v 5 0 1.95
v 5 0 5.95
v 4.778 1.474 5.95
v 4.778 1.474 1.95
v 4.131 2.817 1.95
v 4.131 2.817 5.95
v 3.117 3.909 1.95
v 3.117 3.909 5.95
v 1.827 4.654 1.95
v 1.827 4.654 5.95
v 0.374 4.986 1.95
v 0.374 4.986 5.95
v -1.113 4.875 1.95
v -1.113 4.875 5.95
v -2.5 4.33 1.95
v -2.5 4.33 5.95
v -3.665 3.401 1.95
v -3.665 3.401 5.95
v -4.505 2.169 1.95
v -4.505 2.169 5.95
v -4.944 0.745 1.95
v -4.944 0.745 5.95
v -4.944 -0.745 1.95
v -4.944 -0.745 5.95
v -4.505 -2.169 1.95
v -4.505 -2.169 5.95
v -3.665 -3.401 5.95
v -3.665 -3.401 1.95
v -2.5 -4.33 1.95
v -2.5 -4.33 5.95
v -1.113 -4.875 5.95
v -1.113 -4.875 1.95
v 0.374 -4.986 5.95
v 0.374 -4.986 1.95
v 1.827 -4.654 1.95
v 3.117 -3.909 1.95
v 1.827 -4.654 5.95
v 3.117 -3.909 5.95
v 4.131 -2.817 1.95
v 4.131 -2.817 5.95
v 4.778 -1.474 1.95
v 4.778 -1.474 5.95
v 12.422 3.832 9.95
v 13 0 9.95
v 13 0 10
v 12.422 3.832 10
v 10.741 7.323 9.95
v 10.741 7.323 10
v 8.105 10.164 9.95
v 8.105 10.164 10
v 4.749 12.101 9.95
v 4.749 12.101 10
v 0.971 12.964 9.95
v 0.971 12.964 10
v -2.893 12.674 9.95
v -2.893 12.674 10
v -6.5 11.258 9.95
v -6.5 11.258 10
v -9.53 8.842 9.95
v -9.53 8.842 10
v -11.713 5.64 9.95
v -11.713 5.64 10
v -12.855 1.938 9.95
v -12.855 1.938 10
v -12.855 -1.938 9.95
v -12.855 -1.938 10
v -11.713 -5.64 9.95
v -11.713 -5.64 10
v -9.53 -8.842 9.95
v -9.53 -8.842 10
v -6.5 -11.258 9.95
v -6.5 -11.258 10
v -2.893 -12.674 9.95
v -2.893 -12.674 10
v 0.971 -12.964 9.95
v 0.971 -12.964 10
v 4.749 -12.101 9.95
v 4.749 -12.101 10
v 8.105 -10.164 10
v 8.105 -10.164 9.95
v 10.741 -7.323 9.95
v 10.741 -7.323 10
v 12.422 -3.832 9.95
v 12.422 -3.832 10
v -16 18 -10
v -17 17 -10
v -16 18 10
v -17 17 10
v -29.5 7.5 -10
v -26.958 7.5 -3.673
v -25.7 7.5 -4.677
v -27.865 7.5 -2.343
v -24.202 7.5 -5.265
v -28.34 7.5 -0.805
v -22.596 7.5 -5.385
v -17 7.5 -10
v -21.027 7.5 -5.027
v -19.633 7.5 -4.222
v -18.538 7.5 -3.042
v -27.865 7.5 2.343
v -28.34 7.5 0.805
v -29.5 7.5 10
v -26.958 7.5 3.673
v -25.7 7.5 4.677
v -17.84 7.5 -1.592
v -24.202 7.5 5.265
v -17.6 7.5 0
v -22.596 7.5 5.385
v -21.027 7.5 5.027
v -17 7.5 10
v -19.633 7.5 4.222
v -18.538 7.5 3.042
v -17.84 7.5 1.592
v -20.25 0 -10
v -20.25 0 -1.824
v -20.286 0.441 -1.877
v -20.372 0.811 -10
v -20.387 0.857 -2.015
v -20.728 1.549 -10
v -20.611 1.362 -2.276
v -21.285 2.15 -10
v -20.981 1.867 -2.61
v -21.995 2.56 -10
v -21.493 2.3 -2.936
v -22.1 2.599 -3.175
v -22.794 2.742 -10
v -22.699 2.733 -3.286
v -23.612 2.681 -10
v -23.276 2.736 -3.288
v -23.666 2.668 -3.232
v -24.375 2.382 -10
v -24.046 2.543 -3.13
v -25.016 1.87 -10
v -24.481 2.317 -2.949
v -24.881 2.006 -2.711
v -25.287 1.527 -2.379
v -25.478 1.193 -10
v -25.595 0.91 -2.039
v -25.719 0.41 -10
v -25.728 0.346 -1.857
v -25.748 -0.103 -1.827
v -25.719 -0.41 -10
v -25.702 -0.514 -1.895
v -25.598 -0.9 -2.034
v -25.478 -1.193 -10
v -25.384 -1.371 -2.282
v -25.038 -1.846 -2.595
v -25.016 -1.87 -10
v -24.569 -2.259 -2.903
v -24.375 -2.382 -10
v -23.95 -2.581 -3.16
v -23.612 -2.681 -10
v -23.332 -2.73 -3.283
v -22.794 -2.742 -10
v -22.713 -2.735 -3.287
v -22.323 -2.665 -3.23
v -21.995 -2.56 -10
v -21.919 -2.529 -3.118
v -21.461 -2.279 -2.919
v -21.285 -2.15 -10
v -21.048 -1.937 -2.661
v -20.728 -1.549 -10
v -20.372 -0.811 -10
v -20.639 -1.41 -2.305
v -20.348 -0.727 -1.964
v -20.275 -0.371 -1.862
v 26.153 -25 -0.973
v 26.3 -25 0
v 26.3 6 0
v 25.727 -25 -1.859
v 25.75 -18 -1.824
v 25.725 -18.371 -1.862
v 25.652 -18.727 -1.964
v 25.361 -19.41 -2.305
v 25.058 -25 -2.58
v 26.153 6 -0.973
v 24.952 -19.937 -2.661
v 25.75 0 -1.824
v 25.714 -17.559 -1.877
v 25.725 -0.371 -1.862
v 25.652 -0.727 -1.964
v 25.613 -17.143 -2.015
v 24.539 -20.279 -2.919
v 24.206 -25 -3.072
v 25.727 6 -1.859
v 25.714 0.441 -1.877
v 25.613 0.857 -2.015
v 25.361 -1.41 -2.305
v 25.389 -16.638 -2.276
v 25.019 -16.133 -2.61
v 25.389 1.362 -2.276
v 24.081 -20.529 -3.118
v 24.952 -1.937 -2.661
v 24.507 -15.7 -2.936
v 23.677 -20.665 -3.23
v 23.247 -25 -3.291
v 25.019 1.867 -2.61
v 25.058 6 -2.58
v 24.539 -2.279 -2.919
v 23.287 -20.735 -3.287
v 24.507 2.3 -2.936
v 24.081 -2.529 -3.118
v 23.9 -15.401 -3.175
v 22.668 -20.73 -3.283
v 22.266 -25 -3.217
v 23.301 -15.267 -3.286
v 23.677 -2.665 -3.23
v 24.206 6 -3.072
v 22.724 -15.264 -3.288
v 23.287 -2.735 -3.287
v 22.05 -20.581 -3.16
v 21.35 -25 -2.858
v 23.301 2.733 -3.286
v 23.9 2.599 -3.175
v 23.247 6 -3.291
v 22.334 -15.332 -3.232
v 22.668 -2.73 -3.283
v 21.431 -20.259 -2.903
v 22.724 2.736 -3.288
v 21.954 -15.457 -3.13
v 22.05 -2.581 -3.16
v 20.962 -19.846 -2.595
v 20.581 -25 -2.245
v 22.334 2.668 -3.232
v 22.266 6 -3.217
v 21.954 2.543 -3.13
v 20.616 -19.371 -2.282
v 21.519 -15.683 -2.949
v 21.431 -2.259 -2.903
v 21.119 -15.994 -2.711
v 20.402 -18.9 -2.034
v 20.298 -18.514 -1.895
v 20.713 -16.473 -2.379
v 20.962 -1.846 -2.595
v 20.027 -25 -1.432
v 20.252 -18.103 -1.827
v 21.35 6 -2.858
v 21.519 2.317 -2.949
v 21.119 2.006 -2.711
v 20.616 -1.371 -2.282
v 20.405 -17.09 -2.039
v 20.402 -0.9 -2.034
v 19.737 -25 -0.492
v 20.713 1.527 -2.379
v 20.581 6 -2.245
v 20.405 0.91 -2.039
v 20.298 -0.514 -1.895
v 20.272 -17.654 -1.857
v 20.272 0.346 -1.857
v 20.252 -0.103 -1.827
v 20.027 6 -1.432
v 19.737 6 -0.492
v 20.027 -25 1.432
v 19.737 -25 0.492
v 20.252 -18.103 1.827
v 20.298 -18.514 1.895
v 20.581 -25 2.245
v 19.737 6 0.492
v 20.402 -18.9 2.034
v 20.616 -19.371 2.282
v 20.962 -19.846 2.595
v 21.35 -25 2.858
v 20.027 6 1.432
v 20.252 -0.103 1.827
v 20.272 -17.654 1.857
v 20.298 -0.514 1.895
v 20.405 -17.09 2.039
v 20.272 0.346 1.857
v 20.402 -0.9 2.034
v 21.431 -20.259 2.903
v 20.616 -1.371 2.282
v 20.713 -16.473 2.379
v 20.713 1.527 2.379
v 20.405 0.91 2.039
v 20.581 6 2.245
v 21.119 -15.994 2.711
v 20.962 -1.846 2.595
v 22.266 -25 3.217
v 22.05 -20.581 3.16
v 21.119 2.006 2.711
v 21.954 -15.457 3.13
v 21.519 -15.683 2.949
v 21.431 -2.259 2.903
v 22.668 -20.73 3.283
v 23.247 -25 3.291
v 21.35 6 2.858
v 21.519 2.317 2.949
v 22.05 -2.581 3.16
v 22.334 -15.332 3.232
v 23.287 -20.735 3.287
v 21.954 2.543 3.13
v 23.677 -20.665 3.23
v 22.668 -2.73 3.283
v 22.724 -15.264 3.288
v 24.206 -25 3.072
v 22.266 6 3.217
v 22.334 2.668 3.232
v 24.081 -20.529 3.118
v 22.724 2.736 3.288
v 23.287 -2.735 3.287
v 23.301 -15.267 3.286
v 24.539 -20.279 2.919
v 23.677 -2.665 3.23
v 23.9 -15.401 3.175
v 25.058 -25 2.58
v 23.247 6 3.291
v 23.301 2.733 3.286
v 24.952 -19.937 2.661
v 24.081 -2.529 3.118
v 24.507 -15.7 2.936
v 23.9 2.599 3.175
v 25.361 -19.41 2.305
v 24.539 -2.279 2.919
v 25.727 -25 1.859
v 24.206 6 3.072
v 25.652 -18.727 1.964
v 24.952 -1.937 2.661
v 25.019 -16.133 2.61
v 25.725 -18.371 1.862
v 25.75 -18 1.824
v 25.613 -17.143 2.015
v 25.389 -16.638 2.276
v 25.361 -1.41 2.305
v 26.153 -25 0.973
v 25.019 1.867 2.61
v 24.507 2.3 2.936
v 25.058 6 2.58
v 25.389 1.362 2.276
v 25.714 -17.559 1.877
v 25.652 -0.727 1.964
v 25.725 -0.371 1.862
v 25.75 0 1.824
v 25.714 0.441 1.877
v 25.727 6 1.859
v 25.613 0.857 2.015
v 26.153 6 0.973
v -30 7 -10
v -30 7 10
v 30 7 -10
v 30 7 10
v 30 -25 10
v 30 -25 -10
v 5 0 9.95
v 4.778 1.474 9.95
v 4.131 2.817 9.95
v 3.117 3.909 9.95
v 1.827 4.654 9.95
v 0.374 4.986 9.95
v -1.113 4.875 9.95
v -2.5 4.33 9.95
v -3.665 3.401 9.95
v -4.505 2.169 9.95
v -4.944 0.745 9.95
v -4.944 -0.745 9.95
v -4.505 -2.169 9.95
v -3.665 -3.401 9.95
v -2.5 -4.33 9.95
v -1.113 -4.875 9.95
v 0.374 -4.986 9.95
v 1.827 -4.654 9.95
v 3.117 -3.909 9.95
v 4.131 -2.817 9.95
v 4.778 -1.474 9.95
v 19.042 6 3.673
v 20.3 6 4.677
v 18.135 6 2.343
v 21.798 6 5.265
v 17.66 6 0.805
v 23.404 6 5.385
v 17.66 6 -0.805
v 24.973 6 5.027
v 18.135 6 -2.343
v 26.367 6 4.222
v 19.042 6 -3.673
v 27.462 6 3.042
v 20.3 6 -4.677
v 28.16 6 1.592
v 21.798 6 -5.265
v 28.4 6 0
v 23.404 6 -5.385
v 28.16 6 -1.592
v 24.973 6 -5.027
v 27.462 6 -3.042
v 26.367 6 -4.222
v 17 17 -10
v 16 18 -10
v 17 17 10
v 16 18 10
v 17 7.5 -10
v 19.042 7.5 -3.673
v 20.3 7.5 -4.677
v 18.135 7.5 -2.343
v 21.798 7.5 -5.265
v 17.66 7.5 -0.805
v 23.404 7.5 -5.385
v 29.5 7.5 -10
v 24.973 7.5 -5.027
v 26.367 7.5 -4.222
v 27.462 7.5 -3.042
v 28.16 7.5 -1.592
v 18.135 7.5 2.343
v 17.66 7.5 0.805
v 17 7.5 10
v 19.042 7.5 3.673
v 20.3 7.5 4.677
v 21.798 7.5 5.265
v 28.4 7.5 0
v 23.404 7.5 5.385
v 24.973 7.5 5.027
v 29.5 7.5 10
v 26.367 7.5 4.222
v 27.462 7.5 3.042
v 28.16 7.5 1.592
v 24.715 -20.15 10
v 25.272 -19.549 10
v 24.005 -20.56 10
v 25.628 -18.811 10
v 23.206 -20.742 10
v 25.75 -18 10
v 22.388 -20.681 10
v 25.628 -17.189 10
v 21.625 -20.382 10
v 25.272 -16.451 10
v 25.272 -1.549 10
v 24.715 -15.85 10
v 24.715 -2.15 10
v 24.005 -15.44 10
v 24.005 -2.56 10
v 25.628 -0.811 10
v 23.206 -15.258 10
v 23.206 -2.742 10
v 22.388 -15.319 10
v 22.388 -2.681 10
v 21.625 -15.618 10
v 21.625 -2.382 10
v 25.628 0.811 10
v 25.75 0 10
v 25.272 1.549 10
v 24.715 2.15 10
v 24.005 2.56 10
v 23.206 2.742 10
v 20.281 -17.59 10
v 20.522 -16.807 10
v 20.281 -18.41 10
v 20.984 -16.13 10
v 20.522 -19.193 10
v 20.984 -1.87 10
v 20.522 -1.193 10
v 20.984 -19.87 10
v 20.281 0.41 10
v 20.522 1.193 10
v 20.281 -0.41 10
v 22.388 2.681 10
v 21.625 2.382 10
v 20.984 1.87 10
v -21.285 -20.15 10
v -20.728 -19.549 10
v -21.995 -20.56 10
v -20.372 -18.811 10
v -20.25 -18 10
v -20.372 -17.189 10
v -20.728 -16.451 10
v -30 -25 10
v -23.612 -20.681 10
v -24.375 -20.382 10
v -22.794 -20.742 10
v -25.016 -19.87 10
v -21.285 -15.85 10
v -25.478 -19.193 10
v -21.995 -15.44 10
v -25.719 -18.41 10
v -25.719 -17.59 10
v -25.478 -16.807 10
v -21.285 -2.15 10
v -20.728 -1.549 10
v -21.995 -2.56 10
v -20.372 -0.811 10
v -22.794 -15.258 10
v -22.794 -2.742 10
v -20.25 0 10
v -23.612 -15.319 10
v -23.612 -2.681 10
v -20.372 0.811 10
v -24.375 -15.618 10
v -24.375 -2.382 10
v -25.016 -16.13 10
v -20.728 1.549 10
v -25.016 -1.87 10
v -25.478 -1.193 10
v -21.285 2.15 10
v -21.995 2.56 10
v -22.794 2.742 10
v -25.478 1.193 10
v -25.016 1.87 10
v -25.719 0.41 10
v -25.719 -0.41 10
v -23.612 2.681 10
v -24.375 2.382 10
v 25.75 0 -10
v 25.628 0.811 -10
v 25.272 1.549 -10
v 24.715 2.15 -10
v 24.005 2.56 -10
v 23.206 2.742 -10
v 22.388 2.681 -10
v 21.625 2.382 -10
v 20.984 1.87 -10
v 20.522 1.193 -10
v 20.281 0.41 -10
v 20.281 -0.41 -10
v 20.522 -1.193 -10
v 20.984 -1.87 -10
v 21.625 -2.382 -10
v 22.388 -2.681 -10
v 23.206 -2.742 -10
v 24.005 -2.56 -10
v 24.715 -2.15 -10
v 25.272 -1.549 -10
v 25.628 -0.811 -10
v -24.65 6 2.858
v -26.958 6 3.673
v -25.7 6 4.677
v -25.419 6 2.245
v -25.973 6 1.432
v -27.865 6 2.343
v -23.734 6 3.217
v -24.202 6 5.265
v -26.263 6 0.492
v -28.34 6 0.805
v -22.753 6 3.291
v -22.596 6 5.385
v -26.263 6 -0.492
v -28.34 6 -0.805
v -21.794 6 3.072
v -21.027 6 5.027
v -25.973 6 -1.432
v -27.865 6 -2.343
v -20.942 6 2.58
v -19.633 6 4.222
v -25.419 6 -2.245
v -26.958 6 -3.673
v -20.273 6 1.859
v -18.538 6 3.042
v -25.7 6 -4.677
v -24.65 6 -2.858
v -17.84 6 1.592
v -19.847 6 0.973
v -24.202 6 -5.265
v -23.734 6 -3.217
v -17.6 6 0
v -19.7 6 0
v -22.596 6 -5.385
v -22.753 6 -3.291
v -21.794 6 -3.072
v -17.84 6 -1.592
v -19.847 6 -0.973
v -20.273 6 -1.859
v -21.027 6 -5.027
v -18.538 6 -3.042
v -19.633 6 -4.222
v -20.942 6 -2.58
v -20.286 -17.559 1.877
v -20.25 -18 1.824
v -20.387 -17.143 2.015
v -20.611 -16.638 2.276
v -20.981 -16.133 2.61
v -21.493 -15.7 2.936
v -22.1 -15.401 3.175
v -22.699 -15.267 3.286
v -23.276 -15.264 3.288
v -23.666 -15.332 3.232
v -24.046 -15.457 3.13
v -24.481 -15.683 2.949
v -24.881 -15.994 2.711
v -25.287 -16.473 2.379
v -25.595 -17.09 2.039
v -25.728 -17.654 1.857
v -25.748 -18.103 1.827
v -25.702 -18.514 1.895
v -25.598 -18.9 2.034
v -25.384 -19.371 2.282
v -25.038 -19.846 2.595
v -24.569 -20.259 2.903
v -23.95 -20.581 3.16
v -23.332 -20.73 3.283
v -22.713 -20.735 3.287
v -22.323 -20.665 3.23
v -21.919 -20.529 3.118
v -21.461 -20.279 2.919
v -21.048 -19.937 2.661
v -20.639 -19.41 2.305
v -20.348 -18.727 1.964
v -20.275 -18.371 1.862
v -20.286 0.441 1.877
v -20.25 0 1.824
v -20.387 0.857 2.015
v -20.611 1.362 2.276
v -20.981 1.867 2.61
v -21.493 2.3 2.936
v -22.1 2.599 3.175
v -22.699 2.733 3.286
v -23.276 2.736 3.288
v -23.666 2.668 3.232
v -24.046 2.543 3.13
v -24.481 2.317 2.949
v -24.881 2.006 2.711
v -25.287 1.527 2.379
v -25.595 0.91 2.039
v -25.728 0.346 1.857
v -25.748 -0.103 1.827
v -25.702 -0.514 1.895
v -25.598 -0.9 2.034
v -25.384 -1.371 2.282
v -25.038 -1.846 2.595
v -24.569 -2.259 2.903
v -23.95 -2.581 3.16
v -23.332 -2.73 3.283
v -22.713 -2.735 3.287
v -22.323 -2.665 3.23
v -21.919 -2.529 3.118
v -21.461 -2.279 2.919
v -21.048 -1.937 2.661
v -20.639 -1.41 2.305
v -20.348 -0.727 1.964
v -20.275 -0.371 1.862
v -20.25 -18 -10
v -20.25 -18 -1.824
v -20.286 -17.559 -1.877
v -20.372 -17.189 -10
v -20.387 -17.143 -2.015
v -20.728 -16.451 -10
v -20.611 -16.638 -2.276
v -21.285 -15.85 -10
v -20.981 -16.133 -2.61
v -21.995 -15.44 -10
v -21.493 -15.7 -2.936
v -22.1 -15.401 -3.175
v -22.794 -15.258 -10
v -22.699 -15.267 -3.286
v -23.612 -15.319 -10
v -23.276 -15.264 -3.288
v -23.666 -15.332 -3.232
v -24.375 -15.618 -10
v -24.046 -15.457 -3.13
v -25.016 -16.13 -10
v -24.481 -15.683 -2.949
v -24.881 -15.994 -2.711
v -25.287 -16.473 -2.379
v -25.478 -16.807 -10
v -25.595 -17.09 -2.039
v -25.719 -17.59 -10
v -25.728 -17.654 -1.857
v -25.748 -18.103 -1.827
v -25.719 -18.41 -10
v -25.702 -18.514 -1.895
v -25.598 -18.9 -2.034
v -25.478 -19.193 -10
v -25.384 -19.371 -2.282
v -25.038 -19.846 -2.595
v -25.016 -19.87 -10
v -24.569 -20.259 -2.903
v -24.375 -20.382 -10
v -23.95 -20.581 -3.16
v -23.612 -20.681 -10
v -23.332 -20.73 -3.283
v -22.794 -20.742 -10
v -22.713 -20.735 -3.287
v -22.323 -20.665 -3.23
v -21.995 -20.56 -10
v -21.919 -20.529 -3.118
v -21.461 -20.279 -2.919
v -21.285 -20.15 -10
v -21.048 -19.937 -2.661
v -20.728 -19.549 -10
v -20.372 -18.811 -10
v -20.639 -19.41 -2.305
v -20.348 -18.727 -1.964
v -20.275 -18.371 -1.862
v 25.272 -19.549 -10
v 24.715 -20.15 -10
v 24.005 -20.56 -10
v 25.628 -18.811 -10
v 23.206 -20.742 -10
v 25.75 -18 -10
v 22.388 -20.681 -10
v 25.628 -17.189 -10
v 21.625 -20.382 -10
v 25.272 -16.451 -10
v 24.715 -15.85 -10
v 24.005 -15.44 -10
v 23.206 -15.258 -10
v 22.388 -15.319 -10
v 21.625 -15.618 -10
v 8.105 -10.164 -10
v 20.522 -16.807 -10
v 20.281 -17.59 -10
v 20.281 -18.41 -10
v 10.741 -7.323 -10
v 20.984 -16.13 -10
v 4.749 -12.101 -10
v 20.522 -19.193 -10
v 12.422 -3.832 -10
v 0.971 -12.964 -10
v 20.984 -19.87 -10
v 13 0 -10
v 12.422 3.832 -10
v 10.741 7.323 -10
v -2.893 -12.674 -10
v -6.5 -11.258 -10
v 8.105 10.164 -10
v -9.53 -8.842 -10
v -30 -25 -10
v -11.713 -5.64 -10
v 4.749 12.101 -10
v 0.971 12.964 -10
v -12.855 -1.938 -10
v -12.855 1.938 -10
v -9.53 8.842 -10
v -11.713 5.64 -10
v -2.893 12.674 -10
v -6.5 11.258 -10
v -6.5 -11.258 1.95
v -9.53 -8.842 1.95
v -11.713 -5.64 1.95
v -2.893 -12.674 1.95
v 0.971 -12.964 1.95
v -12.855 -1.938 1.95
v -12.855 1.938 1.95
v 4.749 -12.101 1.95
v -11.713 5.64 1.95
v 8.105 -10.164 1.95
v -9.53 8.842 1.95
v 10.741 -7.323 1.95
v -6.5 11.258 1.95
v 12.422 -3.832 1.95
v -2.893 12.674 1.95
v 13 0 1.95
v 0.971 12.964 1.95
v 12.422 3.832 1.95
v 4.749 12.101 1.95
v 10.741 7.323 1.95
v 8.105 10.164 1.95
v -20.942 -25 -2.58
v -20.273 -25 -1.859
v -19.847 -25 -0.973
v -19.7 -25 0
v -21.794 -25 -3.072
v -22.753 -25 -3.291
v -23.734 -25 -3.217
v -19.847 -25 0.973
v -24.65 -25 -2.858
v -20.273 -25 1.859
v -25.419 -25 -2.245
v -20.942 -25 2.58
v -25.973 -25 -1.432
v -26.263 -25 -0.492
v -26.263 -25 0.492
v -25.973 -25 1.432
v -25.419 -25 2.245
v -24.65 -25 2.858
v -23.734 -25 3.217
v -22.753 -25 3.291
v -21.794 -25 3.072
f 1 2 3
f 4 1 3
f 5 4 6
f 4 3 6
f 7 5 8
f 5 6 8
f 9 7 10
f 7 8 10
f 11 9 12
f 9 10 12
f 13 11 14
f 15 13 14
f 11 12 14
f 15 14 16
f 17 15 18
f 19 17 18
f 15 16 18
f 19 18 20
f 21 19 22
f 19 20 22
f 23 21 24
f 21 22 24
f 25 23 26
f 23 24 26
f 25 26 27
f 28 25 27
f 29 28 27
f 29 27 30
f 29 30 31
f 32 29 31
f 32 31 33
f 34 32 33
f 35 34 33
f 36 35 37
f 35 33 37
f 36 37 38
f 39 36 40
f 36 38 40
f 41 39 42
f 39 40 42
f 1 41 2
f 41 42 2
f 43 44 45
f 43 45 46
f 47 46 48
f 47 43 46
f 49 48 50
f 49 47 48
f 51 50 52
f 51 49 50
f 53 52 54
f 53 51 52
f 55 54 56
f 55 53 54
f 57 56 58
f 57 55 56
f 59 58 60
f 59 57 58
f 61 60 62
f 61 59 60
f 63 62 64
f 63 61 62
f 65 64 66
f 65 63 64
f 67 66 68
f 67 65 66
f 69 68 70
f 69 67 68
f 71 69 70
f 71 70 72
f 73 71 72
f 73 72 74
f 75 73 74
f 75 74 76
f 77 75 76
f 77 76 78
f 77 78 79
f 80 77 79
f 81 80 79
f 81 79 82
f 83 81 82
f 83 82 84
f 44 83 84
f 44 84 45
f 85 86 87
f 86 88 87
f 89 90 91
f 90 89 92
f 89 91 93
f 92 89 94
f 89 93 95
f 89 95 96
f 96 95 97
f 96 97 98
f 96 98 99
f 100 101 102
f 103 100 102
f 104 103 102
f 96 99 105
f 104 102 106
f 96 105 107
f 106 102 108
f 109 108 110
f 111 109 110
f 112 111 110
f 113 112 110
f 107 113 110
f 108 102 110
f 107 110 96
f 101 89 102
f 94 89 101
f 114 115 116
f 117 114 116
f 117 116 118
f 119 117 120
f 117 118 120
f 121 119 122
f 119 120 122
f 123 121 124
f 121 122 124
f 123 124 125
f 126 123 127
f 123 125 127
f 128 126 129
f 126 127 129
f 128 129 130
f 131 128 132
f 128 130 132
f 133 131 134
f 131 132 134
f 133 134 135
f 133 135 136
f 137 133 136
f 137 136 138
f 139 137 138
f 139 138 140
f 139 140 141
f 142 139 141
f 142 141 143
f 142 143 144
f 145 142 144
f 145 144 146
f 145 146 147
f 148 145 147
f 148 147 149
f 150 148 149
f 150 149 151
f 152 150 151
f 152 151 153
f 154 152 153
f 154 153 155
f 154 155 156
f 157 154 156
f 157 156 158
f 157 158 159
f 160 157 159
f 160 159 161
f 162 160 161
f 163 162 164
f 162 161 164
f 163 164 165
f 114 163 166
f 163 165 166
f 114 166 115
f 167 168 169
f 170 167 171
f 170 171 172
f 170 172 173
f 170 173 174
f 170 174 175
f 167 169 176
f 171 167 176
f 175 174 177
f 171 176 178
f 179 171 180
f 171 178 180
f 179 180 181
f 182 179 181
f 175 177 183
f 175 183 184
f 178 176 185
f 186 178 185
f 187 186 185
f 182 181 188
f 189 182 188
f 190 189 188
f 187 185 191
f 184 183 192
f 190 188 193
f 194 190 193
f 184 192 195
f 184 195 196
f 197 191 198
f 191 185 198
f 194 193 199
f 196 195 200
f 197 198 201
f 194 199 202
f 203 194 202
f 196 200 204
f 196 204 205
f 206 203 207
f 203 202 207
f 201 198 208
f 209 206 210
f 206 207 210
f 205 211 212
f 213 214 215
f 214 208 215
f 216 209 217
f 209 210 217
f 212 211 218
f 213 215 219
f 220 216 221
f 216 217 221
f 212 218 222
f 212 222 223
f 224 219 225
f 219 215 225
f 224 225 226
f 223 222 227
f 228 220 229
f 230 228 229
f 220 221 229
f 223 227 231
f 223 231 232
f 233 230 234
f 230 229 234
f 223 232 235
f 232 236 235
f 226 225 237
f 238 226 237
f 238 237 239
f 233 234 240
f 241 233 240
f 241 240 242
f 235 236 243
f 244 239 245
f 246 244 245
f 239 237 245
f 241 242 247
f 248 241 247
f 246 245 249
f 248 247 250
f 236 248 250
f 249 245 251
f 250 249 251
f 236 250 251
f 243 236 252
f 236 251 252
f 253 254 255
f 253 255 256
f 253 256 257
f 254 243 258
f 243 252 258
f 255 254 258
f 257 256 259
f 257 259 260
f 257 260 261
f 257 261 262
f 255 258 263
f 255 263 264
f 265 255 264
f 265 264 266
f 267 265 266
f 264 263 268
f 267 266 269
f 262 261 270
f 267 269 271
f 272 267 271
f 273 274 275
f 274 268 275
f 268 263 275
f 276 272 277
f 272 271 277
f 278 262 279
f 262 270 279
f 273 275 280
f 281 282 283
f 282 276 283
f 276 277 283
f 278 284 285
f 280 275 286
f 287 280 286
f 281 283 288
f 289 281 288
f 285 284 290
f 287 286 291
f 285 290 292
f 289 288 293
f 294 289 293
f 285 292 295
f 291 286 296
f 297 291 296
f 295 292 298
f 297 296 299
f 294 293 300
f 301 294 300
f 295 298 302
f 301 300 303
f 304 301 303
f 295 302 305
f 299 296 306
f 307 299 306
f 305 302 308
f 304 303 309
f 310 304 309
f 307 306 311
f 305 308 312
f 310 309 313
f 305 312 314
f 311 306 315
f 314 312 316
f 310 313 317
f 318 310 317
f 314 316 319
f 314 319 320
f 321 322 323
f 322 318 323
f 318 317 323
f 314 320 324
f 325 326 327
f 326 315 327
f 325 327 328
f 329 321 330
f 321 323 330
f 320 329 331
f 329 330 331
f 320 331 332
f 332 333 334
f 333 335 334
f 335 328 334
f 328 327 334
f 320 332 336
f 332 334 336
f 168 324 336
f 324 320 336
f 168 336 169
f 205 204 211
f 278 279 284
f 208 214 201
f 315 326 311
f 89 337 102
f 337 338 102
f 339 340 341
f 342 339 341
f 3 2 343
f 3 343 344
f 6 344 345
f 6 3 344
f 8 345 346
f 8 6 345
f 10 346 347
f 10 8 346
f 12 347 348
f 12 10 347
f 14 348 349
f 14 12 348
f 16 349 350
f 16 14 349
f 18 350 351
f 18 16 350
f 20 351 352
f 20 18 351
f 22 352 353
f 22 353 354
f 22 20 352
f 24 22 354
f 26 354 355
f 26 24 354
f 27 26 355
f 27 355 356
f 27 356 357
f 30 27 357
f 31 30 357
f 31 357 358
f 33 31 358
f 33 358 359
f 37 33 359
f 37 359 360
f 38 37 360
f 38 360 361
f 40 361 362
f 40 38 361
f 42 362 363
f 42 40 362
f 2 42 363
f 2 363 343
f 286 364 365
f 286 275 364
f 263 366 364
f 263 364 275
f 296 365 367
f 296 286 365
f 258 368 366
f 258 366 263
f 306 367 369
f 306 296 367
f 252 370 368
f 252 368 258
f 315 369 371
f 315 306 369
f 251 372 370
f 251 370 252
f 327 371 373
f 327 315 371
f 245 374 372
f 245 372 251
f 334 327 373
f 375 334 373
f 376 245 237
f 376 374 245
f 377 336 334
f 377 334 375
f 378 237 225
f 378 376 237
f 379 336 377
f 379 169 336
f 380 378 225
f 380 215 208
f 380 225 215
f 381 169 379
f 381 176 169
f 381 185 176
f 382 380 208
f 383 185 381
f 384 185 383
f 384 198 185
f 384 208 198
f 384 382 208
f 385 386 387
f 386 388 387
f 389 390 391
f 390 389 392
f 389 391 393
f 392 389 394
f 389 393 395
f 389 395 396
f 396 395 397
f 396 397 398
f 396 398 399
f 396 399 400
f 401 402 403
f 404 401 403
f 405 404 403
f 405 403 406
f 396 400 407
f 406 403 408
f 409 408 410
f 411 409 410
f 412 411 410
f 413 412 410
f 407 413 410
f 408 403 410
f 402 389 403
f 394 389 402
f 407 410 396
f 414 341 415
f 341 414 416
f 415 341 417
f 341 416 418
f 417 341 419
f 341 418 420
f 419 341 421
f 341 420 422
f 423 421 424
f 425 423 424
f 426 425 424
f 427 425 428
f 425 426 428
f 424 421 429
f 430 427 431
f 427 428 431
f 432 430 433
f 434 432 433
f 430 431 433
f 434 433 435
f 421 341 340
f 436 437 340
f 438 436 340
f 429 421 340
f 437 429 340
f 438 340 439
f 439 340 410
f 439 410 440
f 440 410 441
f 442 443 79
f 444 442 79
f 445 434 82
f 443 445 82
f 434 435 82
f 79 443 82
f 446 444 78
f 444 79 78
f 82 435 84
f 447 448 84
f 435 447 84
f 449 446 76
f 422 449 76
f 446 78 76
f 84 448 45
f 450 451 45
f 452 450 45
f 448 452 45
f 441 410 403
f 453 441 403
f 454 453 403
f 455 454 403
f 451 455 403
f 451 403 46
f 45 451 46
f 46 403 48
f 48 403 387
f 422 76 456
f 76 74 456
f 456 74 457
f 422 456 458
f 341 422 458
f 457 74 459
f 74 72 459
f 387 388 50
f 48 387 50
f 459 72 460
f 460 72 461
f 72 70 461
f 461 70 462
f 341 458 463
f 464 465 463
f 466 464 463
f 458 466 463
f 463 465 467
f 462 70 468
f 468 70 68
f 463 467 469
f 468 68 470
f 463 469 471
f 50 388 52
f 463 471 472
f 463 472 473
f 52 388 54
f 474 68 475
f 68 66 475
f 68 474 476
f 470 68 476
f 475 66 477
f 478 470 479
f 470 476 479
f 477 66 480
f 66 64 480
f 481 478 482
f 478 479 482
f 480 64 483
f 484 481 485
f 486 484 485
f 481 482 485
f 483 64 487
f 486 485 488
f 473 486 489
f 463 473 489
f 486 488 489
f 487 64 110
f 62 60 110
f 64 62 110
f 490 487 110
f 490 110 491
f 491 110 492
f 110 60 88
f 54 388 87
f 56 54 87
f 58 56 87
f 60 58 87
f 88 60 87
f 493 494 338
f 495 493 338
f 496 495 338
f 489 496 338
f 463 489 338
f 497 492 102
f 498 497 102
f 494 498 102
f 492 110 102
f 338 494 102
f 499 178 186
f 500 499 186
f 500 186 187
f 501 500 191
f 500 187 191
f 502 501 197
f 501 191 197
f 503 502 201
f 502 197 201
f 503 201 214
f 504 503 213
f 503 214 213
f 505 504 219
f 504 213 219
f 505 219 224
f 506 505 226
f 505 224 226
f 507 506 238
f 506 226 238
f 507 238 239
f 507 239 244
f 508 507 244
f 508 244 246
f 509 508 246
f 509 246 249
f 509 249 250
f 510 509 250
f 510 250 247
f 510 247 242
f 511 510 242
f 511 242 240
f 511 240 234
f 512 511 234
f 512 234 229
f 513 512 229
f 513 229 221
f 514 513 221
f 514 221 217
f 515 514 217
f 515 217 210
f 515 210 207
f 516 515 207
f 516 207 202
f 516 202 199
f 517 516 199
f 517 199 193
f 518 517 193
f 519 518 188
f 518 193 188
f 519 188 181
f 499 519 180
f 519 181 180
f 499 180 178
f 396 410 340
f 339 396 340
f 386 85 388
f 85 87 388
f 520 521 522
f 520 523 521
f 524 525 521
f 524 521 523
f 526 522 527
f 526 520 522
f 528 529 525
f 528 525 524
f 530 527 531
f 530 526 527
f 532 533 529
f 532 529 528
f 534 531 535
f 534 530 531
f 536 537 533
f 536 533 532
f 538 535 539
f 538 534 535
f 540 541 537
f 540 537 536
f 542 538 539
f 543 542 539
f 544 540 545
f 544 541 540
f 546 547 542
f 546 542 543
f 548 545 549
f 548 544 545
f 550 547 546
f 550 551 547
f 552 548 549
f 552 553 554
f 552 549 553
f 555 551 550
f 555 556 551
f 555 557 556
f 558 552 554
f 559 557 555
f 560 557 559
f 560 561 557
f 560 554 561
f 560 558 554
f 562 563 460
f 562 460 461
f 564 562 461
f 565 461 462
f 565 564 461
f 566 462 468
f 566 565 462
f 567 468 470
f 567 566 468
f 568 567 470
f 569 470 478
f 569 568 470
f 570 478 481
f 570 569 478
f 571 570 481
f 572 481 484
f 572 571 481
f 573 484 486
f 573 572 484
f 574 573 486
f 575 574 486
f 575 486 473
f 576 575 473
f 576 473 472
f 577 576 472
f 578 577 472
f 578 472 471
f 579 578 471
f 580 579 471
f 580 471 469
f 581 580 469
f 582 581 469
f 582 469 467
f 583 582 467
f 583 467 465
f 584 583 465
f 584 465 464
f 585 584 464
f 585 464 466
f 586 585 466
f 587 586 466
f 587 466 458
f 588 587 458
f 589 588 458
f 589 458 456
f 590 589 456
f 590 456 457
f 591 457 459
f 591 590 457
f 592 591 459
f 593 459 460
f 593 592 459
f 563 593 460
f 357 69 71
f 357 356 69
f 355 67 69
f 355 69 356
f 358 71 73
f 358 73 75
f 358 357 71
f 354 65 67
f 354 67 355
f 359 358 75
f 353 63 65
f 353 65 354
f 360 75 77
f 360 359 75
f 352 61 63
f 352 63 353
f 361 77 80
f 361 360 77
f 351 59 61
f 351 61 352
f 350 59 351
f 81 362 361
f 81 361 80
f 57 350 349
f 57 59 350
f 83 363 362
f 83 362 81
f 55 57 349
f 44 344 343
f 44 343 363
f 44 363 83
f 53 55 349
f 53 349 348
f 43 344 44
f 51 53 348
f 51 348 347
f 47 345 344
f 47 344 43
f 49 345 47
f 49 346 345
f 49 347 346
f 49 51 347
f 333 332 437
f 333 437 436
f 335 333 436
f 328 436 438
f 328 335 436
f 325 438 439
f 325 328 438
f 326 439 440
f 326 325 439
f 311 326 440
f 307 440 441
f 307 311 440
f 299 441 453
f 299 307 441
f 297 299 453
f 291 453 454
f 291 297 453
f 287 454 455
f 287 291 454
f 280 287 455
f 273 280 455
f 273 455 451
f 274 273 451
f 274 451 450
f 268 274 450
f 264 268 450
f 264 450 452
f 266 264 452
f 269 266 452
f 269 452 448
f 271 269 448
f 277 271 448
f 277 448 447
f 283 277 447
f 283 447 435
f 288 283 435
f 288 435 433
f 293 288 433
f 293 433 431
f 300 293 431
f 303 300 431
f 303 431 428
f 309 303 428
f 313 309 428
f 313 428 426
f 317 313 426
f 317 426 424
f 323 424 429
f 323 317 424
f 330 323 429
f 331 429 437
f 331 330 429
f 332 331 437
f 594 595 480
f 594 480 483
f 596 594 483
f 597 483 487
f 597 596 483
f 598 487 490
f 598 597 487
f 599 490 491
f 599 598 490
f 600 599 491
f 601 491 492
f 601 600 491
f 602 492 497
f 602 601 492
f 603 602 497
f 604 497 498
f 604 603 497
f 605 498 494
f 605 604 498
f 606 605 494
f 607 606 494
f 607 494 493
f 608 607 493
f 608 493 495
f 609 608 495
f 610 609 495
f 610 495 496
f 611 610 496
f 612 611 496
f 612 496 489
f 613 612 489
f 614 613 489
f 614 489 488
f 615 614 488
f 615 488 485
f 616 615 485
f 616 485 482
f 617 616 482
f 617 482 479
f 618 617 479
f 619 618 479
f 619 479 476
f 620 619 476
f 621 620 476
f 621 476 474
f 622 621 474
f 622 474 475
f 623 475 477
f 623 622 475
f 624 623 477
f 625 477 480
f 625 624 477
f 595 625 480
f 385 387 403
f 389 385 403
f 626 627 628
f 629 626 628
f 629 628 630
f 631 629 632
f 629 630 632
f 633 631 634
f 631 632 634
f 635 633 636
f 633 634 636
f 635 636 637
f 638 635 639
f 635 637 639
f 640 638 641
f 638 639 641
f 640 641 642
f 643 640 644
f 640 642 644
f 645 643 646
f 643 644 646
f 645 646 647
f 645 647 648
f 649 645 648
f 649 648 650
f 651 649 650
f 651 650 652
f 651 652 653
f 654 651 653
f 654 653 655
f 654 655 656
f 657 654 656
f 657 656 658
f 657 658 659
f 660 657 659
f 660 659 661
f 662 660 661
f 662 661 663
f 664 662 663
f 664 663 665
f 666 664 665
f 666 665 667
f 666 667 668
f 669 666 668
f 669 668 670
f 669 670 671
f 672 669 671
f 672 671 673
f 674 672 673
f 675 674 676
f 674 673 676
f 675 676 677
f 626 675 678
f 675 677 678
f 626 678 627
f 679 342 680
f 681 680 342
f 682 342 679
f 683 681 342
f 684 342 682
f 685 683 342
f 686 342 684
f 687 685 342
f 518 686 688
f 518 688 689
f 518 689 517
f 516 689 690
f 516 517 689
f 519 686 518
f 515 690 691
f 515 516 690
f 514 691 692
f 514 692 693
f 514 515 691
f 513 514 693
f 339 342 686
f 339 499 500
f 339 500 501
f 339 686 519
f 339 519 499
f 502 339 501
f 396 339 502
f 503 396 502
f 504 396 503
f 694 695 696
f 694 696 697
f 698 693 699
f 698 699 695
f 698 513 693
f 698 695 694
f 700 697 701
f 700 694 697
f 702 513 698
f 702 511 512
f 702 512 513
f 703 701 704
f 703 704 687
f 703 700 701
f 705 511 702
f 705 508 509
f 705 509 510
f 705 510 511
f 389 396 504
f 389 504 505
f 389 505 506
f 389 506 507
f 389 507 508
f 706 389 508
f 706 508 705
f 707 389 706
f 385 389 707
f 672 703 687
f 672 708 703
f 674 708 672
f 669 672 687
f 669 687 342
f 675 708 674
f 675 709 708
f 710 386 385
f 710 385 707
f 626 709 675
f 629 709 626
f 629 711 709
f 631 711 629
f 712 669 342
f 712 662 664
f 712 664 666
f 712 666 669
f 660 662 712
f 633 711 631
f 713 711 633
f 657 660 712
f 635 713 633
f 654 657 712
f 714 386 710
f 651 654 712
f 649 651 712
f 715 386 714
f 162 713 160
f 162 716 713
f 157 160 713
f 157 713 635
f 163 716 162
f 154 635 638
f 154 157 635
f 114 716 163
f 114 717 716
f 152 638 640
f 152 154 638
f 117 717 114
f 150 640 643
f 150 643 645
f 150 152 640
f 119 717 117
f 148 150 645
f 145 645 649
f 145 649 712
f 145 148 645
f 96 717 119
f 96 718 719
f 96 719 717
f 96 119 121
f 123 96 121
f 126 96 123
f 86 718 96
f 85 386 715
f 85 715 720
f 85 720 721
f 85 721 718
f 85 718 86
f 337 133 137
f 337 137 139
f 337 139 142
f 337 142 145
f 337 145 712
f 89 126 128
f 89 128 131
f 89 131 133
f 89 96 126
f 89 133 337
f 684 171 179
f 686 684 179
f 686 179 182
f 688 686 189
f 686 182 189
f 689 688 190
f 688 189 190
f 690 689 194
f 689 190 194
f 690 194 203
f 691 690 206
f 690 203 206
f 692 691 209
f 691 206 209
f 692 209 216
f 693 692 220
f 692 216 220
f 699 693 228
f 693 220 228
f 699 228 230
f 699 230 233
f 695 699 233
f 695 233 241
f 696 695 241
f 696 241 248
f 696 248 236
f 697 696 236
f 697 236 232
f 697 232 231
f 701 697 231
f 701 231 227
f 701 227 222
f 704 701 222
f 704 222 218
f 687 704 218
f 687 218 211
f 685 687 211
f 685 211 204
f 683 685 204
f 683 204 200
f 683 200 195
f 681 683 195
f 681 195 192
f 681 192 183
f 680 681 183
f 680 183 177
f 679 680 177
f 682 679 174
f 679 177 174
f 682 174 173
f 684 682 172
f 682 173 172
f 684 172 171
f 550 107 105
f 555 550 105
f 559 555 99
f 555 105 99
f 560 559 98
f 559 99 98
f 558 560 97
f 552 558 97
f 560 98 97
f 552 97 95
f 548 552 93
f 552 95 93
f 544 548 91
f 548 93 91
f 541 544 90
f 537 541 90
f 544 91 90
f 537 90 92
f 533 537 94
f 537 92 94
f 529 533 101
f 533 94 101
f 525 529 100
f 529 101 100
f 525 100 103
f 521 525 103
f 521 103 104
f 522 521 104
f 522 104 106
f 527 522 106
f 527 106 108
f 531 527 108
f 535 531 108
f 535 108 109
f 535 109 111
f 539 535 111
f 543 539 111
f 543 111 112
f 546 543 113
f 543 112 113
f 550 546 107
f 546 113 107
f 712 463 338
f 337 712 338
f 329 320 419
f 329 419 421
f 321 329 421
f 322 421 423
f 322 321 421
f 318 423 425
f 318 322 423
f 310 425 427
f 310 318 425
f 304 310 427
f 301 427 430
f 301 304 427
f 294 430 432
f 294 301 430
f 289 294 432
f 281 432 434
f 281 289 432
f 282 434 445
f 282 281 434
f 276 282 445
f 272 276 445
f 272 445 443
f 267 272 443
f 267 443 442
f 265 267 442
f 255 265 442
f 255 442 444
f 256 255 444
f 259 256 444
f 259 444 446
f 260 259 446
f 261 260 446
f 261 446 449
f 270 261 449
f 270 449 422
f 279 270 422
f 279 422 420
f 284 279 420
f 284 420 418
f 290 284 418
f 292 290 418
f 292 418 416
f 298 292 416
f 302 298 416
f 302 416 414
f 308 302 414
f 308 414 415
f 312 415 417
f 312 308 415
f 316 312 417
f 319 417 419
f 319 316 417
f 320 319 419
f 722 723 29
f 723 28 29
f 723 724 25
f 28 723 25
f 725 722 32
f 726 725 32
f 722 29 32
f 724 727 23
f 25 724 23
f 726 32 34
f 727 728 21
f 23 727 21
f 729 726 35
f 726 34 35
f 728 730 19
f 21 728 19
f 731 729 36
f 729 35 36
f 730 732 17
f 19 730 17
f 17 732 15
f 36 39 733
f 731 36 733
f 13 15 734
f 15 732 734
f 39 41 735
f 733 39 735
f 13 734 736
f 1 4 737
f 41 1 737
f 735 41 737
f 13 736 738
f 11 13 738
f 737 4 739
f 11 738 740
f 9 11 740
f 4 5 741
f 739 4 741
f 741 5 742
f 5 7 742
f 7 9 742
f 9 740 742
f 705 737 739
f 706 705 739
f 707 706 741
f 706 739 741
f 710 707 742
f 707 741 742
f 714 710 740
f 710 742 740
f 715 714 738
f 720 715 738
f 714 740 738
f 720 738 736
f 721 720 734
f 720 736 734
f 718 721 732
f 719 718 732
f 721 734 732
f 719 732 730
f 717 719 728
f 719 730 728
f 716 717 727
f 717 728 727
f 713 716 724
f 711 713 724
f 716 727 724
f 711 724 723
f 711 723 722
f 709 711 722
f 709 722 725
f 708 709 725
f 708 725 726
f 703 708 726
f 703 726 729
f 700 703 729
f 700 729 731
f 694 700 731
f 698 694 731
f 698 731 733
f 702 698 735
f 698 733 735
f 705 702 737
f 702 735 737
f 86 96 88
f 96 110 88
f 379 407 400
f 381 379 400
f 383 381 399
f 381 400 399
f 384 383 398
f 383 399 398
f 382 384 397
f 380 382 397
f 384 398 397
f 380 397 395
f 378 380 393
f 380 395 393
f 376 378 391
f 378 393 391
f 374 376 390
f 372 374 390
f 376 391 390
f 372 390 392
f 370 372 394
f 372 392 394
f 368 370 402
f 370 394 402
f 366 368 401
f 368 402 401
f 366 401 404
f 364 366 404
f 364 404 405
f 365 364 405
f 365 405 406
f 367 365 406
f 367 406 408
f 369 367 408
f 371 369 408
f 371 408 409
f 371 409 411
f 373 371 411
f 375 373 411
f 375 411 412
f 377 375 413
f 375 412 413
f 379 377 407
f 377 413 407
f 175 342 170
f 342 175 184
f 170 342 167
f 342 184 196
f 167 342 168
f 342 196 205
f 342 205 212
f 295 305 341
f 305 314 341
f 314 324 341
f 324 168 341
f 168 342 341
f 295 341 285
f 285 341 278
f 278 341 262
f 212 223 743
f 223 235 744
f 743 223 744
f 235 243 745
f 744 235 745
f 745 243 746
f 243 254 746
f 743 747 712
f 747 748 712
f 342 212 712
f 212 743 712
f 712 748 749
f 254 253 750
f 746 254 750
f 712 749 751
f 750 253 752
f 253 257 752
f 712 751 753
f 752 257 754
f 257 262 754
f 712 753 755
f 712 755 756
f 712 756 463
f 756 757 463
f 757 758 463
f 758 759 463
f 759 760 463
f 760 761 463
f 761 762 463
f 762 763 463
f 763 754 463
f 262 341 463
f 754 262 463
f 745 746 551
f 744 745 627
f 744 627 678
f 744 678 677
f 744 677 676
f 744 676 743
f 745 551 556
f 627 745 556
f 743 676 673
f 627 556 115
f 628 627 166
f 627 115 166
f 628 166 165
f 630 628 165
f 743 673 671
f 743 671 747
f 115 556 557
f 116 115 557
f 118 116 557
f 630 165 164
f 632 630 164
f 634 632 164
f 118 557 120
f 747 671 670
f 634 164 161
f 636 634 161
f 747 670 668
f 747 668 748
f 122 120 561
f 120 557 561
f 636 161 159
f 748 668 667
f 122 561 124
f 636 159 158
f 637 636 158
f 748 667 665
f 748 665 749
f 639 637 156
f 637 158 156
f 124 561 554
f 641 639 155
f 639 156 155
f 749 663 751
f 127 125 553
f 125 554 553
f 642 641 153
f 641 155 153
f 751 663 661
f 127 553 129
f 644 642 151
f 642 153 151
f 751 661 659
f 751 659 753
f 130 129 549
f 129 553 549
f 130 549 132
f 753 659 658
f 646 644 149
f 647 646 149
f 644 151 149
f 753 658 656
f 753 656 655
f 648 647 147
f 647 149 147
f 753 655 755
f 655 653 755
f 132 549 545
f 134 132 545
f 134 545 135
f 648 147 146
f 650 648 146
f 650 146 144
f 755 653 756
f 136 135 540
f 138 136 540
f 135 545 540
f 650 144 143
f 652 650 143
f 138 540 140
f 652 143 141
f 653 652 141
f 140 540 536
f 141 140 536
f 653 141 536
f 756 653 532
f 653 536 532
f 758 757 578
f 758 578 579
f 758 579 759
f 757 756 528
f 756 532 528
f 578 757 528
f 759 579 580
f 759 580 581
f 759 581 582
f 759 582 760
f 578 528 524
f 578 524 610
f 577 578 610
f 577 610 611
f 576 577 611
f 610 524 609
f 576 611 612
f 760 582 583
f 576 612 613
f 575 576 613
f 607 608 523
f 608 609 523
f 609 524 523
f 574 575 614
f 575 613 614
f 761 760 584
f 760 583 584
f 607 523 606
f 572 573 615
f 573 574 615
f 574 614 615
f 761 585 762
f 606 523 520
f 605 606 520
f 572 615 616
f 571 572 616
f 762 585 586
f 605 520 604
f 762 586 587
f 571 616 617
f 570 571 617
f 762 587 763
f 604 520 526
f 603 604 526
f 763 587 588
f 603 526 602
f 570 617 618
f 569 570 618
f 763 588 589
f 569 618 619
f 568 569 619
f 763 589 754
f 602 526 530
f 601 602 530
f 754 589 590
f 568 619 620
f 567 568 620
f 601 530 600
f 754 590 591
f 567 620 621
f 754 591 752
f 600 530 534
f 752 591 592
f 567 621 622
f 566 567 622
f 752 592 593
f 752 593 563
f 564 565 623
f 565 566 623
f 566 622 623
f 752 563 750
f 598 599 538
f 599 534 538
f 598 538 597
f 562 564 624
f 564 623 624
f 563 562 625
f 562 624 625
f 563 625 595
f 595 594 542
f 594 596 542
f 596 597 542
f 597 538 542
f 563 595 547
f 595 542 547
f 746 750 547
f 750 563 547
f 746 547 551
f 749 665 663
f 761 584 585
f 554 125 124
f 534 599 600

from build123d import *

# Parameters (mm, degrees)
EXTRUDE_1_DEPTH      = 10
EXTRUDE_1_DEPTH_BACK = 10
SKETCH_1_R           = 2.75
SKETCH_1_R_2         = 13
CUT_EXTRUDE_START    = 7.5
SKETCH_2_R           = 3.3
CUT_EXTRUDE_1_DEPTH  = 48.811288741
SKETCH_3_R           = 5.4
CUT_EXTRUDE_2_DEPTH  = 1.5
EXTRUDE_2_DEPTH      = 4
EXTRUDE_2_DEPTH_BACK = 4
EXTRUDE_2_START      = 5.95
SKETCH_4_R           = 13
SKETCH_4_R_2         = 5


with BuildPart() as part:
    # Эскиз1 → Бобышка-Вытянуть1 (new, two sides: drawn at the far end of the back side and taken through both)
    with BuildSketch(Plane.XY.offset(-EXTRUDE_1_DEPTH_BACK)):
        Polygon((-30, -25), (-30, 7), (-29.5, 7.5), (-17, 7.5), (-17, 17), (-16, 18), (16, 18), (17, 17), (17, 7.5), (29.5, 7.5), (30, 7), (30, -25), align=None)
        with Locations((-23, 0)):
            Circle(SKETCH_1_R, mode=Mode.SUBTRACT)
        with Locations((-23, -18)):
            Circle(SKETCH_1_R, mode=Mode.SUBTRACT)
        with Locations((23, -18)):
            Circle(SKETCH_1_R, mode=Mode.SUBTRACT)
        with Locations((23, 0)):
            Circle(SKETCH_1_R, mode=Mode.SUBTRACT)
        Circle(SKETCH_1_R_2, mode=Mode.SUBTRACT)
    extrude(amount=EXTRUDE_1_DEPTH + EXTRUDE_1_DEPTH_BACK)

    # Эскиз2 → Вырез-Вытянуть1 (cut, through all)
    with BuildSketch(Plane(origin=(0, 0, 0), x_dir=(1, 0, 0), z_dir=(0, 1, 0)).offset(CUT_EXTRUDE_START)):
        with Locations((-23, 0)):
            Circle(SKETCH_2_R)
        with Locations((23, 0)):
            Circle(SKETCH_2_R)
    extrude(amount=-CUT_EXTRUDE_1_DEPTH, mode=Mode.SUBTRACT)

    # Эскиз3 → Вырез-Вытянуть2 (cut)
    with BuildSketch(Plane(origin=(0, 0, 0), x_dir=(1, 0, 0), z_dir=(0, 1, 0)).offset(CUT_EXTRUDE_START)):
        with Locations((-23, 0)):
            Circle(SKETCH_3_R)
        with Locations((23, 0)):
            Circle(SKETCH_3_R)
    extrude(amount=-CUT_EXTRUDE_2_DEPTH, mode=Mode.SUBTRACT)

    # Эскиз4 → Бобышка-Вытянуть2 (add, two sides: drawn at the far end of the back side and taken through both)
    with BuildSketch(Plane.XY.offset(EXTRUDE_2_START - EXTRUDE_2_DEPTH_BACK)):
        Circle(SKETCH_4_R)
        Circle(SKETCH_4_R_2, mode=Mode.SUBTRACT)
    extrude(amount=EXTRUDE_2_DEPTH + EXTRUDE_2_DEPTH_BACK)


solid = part.part
